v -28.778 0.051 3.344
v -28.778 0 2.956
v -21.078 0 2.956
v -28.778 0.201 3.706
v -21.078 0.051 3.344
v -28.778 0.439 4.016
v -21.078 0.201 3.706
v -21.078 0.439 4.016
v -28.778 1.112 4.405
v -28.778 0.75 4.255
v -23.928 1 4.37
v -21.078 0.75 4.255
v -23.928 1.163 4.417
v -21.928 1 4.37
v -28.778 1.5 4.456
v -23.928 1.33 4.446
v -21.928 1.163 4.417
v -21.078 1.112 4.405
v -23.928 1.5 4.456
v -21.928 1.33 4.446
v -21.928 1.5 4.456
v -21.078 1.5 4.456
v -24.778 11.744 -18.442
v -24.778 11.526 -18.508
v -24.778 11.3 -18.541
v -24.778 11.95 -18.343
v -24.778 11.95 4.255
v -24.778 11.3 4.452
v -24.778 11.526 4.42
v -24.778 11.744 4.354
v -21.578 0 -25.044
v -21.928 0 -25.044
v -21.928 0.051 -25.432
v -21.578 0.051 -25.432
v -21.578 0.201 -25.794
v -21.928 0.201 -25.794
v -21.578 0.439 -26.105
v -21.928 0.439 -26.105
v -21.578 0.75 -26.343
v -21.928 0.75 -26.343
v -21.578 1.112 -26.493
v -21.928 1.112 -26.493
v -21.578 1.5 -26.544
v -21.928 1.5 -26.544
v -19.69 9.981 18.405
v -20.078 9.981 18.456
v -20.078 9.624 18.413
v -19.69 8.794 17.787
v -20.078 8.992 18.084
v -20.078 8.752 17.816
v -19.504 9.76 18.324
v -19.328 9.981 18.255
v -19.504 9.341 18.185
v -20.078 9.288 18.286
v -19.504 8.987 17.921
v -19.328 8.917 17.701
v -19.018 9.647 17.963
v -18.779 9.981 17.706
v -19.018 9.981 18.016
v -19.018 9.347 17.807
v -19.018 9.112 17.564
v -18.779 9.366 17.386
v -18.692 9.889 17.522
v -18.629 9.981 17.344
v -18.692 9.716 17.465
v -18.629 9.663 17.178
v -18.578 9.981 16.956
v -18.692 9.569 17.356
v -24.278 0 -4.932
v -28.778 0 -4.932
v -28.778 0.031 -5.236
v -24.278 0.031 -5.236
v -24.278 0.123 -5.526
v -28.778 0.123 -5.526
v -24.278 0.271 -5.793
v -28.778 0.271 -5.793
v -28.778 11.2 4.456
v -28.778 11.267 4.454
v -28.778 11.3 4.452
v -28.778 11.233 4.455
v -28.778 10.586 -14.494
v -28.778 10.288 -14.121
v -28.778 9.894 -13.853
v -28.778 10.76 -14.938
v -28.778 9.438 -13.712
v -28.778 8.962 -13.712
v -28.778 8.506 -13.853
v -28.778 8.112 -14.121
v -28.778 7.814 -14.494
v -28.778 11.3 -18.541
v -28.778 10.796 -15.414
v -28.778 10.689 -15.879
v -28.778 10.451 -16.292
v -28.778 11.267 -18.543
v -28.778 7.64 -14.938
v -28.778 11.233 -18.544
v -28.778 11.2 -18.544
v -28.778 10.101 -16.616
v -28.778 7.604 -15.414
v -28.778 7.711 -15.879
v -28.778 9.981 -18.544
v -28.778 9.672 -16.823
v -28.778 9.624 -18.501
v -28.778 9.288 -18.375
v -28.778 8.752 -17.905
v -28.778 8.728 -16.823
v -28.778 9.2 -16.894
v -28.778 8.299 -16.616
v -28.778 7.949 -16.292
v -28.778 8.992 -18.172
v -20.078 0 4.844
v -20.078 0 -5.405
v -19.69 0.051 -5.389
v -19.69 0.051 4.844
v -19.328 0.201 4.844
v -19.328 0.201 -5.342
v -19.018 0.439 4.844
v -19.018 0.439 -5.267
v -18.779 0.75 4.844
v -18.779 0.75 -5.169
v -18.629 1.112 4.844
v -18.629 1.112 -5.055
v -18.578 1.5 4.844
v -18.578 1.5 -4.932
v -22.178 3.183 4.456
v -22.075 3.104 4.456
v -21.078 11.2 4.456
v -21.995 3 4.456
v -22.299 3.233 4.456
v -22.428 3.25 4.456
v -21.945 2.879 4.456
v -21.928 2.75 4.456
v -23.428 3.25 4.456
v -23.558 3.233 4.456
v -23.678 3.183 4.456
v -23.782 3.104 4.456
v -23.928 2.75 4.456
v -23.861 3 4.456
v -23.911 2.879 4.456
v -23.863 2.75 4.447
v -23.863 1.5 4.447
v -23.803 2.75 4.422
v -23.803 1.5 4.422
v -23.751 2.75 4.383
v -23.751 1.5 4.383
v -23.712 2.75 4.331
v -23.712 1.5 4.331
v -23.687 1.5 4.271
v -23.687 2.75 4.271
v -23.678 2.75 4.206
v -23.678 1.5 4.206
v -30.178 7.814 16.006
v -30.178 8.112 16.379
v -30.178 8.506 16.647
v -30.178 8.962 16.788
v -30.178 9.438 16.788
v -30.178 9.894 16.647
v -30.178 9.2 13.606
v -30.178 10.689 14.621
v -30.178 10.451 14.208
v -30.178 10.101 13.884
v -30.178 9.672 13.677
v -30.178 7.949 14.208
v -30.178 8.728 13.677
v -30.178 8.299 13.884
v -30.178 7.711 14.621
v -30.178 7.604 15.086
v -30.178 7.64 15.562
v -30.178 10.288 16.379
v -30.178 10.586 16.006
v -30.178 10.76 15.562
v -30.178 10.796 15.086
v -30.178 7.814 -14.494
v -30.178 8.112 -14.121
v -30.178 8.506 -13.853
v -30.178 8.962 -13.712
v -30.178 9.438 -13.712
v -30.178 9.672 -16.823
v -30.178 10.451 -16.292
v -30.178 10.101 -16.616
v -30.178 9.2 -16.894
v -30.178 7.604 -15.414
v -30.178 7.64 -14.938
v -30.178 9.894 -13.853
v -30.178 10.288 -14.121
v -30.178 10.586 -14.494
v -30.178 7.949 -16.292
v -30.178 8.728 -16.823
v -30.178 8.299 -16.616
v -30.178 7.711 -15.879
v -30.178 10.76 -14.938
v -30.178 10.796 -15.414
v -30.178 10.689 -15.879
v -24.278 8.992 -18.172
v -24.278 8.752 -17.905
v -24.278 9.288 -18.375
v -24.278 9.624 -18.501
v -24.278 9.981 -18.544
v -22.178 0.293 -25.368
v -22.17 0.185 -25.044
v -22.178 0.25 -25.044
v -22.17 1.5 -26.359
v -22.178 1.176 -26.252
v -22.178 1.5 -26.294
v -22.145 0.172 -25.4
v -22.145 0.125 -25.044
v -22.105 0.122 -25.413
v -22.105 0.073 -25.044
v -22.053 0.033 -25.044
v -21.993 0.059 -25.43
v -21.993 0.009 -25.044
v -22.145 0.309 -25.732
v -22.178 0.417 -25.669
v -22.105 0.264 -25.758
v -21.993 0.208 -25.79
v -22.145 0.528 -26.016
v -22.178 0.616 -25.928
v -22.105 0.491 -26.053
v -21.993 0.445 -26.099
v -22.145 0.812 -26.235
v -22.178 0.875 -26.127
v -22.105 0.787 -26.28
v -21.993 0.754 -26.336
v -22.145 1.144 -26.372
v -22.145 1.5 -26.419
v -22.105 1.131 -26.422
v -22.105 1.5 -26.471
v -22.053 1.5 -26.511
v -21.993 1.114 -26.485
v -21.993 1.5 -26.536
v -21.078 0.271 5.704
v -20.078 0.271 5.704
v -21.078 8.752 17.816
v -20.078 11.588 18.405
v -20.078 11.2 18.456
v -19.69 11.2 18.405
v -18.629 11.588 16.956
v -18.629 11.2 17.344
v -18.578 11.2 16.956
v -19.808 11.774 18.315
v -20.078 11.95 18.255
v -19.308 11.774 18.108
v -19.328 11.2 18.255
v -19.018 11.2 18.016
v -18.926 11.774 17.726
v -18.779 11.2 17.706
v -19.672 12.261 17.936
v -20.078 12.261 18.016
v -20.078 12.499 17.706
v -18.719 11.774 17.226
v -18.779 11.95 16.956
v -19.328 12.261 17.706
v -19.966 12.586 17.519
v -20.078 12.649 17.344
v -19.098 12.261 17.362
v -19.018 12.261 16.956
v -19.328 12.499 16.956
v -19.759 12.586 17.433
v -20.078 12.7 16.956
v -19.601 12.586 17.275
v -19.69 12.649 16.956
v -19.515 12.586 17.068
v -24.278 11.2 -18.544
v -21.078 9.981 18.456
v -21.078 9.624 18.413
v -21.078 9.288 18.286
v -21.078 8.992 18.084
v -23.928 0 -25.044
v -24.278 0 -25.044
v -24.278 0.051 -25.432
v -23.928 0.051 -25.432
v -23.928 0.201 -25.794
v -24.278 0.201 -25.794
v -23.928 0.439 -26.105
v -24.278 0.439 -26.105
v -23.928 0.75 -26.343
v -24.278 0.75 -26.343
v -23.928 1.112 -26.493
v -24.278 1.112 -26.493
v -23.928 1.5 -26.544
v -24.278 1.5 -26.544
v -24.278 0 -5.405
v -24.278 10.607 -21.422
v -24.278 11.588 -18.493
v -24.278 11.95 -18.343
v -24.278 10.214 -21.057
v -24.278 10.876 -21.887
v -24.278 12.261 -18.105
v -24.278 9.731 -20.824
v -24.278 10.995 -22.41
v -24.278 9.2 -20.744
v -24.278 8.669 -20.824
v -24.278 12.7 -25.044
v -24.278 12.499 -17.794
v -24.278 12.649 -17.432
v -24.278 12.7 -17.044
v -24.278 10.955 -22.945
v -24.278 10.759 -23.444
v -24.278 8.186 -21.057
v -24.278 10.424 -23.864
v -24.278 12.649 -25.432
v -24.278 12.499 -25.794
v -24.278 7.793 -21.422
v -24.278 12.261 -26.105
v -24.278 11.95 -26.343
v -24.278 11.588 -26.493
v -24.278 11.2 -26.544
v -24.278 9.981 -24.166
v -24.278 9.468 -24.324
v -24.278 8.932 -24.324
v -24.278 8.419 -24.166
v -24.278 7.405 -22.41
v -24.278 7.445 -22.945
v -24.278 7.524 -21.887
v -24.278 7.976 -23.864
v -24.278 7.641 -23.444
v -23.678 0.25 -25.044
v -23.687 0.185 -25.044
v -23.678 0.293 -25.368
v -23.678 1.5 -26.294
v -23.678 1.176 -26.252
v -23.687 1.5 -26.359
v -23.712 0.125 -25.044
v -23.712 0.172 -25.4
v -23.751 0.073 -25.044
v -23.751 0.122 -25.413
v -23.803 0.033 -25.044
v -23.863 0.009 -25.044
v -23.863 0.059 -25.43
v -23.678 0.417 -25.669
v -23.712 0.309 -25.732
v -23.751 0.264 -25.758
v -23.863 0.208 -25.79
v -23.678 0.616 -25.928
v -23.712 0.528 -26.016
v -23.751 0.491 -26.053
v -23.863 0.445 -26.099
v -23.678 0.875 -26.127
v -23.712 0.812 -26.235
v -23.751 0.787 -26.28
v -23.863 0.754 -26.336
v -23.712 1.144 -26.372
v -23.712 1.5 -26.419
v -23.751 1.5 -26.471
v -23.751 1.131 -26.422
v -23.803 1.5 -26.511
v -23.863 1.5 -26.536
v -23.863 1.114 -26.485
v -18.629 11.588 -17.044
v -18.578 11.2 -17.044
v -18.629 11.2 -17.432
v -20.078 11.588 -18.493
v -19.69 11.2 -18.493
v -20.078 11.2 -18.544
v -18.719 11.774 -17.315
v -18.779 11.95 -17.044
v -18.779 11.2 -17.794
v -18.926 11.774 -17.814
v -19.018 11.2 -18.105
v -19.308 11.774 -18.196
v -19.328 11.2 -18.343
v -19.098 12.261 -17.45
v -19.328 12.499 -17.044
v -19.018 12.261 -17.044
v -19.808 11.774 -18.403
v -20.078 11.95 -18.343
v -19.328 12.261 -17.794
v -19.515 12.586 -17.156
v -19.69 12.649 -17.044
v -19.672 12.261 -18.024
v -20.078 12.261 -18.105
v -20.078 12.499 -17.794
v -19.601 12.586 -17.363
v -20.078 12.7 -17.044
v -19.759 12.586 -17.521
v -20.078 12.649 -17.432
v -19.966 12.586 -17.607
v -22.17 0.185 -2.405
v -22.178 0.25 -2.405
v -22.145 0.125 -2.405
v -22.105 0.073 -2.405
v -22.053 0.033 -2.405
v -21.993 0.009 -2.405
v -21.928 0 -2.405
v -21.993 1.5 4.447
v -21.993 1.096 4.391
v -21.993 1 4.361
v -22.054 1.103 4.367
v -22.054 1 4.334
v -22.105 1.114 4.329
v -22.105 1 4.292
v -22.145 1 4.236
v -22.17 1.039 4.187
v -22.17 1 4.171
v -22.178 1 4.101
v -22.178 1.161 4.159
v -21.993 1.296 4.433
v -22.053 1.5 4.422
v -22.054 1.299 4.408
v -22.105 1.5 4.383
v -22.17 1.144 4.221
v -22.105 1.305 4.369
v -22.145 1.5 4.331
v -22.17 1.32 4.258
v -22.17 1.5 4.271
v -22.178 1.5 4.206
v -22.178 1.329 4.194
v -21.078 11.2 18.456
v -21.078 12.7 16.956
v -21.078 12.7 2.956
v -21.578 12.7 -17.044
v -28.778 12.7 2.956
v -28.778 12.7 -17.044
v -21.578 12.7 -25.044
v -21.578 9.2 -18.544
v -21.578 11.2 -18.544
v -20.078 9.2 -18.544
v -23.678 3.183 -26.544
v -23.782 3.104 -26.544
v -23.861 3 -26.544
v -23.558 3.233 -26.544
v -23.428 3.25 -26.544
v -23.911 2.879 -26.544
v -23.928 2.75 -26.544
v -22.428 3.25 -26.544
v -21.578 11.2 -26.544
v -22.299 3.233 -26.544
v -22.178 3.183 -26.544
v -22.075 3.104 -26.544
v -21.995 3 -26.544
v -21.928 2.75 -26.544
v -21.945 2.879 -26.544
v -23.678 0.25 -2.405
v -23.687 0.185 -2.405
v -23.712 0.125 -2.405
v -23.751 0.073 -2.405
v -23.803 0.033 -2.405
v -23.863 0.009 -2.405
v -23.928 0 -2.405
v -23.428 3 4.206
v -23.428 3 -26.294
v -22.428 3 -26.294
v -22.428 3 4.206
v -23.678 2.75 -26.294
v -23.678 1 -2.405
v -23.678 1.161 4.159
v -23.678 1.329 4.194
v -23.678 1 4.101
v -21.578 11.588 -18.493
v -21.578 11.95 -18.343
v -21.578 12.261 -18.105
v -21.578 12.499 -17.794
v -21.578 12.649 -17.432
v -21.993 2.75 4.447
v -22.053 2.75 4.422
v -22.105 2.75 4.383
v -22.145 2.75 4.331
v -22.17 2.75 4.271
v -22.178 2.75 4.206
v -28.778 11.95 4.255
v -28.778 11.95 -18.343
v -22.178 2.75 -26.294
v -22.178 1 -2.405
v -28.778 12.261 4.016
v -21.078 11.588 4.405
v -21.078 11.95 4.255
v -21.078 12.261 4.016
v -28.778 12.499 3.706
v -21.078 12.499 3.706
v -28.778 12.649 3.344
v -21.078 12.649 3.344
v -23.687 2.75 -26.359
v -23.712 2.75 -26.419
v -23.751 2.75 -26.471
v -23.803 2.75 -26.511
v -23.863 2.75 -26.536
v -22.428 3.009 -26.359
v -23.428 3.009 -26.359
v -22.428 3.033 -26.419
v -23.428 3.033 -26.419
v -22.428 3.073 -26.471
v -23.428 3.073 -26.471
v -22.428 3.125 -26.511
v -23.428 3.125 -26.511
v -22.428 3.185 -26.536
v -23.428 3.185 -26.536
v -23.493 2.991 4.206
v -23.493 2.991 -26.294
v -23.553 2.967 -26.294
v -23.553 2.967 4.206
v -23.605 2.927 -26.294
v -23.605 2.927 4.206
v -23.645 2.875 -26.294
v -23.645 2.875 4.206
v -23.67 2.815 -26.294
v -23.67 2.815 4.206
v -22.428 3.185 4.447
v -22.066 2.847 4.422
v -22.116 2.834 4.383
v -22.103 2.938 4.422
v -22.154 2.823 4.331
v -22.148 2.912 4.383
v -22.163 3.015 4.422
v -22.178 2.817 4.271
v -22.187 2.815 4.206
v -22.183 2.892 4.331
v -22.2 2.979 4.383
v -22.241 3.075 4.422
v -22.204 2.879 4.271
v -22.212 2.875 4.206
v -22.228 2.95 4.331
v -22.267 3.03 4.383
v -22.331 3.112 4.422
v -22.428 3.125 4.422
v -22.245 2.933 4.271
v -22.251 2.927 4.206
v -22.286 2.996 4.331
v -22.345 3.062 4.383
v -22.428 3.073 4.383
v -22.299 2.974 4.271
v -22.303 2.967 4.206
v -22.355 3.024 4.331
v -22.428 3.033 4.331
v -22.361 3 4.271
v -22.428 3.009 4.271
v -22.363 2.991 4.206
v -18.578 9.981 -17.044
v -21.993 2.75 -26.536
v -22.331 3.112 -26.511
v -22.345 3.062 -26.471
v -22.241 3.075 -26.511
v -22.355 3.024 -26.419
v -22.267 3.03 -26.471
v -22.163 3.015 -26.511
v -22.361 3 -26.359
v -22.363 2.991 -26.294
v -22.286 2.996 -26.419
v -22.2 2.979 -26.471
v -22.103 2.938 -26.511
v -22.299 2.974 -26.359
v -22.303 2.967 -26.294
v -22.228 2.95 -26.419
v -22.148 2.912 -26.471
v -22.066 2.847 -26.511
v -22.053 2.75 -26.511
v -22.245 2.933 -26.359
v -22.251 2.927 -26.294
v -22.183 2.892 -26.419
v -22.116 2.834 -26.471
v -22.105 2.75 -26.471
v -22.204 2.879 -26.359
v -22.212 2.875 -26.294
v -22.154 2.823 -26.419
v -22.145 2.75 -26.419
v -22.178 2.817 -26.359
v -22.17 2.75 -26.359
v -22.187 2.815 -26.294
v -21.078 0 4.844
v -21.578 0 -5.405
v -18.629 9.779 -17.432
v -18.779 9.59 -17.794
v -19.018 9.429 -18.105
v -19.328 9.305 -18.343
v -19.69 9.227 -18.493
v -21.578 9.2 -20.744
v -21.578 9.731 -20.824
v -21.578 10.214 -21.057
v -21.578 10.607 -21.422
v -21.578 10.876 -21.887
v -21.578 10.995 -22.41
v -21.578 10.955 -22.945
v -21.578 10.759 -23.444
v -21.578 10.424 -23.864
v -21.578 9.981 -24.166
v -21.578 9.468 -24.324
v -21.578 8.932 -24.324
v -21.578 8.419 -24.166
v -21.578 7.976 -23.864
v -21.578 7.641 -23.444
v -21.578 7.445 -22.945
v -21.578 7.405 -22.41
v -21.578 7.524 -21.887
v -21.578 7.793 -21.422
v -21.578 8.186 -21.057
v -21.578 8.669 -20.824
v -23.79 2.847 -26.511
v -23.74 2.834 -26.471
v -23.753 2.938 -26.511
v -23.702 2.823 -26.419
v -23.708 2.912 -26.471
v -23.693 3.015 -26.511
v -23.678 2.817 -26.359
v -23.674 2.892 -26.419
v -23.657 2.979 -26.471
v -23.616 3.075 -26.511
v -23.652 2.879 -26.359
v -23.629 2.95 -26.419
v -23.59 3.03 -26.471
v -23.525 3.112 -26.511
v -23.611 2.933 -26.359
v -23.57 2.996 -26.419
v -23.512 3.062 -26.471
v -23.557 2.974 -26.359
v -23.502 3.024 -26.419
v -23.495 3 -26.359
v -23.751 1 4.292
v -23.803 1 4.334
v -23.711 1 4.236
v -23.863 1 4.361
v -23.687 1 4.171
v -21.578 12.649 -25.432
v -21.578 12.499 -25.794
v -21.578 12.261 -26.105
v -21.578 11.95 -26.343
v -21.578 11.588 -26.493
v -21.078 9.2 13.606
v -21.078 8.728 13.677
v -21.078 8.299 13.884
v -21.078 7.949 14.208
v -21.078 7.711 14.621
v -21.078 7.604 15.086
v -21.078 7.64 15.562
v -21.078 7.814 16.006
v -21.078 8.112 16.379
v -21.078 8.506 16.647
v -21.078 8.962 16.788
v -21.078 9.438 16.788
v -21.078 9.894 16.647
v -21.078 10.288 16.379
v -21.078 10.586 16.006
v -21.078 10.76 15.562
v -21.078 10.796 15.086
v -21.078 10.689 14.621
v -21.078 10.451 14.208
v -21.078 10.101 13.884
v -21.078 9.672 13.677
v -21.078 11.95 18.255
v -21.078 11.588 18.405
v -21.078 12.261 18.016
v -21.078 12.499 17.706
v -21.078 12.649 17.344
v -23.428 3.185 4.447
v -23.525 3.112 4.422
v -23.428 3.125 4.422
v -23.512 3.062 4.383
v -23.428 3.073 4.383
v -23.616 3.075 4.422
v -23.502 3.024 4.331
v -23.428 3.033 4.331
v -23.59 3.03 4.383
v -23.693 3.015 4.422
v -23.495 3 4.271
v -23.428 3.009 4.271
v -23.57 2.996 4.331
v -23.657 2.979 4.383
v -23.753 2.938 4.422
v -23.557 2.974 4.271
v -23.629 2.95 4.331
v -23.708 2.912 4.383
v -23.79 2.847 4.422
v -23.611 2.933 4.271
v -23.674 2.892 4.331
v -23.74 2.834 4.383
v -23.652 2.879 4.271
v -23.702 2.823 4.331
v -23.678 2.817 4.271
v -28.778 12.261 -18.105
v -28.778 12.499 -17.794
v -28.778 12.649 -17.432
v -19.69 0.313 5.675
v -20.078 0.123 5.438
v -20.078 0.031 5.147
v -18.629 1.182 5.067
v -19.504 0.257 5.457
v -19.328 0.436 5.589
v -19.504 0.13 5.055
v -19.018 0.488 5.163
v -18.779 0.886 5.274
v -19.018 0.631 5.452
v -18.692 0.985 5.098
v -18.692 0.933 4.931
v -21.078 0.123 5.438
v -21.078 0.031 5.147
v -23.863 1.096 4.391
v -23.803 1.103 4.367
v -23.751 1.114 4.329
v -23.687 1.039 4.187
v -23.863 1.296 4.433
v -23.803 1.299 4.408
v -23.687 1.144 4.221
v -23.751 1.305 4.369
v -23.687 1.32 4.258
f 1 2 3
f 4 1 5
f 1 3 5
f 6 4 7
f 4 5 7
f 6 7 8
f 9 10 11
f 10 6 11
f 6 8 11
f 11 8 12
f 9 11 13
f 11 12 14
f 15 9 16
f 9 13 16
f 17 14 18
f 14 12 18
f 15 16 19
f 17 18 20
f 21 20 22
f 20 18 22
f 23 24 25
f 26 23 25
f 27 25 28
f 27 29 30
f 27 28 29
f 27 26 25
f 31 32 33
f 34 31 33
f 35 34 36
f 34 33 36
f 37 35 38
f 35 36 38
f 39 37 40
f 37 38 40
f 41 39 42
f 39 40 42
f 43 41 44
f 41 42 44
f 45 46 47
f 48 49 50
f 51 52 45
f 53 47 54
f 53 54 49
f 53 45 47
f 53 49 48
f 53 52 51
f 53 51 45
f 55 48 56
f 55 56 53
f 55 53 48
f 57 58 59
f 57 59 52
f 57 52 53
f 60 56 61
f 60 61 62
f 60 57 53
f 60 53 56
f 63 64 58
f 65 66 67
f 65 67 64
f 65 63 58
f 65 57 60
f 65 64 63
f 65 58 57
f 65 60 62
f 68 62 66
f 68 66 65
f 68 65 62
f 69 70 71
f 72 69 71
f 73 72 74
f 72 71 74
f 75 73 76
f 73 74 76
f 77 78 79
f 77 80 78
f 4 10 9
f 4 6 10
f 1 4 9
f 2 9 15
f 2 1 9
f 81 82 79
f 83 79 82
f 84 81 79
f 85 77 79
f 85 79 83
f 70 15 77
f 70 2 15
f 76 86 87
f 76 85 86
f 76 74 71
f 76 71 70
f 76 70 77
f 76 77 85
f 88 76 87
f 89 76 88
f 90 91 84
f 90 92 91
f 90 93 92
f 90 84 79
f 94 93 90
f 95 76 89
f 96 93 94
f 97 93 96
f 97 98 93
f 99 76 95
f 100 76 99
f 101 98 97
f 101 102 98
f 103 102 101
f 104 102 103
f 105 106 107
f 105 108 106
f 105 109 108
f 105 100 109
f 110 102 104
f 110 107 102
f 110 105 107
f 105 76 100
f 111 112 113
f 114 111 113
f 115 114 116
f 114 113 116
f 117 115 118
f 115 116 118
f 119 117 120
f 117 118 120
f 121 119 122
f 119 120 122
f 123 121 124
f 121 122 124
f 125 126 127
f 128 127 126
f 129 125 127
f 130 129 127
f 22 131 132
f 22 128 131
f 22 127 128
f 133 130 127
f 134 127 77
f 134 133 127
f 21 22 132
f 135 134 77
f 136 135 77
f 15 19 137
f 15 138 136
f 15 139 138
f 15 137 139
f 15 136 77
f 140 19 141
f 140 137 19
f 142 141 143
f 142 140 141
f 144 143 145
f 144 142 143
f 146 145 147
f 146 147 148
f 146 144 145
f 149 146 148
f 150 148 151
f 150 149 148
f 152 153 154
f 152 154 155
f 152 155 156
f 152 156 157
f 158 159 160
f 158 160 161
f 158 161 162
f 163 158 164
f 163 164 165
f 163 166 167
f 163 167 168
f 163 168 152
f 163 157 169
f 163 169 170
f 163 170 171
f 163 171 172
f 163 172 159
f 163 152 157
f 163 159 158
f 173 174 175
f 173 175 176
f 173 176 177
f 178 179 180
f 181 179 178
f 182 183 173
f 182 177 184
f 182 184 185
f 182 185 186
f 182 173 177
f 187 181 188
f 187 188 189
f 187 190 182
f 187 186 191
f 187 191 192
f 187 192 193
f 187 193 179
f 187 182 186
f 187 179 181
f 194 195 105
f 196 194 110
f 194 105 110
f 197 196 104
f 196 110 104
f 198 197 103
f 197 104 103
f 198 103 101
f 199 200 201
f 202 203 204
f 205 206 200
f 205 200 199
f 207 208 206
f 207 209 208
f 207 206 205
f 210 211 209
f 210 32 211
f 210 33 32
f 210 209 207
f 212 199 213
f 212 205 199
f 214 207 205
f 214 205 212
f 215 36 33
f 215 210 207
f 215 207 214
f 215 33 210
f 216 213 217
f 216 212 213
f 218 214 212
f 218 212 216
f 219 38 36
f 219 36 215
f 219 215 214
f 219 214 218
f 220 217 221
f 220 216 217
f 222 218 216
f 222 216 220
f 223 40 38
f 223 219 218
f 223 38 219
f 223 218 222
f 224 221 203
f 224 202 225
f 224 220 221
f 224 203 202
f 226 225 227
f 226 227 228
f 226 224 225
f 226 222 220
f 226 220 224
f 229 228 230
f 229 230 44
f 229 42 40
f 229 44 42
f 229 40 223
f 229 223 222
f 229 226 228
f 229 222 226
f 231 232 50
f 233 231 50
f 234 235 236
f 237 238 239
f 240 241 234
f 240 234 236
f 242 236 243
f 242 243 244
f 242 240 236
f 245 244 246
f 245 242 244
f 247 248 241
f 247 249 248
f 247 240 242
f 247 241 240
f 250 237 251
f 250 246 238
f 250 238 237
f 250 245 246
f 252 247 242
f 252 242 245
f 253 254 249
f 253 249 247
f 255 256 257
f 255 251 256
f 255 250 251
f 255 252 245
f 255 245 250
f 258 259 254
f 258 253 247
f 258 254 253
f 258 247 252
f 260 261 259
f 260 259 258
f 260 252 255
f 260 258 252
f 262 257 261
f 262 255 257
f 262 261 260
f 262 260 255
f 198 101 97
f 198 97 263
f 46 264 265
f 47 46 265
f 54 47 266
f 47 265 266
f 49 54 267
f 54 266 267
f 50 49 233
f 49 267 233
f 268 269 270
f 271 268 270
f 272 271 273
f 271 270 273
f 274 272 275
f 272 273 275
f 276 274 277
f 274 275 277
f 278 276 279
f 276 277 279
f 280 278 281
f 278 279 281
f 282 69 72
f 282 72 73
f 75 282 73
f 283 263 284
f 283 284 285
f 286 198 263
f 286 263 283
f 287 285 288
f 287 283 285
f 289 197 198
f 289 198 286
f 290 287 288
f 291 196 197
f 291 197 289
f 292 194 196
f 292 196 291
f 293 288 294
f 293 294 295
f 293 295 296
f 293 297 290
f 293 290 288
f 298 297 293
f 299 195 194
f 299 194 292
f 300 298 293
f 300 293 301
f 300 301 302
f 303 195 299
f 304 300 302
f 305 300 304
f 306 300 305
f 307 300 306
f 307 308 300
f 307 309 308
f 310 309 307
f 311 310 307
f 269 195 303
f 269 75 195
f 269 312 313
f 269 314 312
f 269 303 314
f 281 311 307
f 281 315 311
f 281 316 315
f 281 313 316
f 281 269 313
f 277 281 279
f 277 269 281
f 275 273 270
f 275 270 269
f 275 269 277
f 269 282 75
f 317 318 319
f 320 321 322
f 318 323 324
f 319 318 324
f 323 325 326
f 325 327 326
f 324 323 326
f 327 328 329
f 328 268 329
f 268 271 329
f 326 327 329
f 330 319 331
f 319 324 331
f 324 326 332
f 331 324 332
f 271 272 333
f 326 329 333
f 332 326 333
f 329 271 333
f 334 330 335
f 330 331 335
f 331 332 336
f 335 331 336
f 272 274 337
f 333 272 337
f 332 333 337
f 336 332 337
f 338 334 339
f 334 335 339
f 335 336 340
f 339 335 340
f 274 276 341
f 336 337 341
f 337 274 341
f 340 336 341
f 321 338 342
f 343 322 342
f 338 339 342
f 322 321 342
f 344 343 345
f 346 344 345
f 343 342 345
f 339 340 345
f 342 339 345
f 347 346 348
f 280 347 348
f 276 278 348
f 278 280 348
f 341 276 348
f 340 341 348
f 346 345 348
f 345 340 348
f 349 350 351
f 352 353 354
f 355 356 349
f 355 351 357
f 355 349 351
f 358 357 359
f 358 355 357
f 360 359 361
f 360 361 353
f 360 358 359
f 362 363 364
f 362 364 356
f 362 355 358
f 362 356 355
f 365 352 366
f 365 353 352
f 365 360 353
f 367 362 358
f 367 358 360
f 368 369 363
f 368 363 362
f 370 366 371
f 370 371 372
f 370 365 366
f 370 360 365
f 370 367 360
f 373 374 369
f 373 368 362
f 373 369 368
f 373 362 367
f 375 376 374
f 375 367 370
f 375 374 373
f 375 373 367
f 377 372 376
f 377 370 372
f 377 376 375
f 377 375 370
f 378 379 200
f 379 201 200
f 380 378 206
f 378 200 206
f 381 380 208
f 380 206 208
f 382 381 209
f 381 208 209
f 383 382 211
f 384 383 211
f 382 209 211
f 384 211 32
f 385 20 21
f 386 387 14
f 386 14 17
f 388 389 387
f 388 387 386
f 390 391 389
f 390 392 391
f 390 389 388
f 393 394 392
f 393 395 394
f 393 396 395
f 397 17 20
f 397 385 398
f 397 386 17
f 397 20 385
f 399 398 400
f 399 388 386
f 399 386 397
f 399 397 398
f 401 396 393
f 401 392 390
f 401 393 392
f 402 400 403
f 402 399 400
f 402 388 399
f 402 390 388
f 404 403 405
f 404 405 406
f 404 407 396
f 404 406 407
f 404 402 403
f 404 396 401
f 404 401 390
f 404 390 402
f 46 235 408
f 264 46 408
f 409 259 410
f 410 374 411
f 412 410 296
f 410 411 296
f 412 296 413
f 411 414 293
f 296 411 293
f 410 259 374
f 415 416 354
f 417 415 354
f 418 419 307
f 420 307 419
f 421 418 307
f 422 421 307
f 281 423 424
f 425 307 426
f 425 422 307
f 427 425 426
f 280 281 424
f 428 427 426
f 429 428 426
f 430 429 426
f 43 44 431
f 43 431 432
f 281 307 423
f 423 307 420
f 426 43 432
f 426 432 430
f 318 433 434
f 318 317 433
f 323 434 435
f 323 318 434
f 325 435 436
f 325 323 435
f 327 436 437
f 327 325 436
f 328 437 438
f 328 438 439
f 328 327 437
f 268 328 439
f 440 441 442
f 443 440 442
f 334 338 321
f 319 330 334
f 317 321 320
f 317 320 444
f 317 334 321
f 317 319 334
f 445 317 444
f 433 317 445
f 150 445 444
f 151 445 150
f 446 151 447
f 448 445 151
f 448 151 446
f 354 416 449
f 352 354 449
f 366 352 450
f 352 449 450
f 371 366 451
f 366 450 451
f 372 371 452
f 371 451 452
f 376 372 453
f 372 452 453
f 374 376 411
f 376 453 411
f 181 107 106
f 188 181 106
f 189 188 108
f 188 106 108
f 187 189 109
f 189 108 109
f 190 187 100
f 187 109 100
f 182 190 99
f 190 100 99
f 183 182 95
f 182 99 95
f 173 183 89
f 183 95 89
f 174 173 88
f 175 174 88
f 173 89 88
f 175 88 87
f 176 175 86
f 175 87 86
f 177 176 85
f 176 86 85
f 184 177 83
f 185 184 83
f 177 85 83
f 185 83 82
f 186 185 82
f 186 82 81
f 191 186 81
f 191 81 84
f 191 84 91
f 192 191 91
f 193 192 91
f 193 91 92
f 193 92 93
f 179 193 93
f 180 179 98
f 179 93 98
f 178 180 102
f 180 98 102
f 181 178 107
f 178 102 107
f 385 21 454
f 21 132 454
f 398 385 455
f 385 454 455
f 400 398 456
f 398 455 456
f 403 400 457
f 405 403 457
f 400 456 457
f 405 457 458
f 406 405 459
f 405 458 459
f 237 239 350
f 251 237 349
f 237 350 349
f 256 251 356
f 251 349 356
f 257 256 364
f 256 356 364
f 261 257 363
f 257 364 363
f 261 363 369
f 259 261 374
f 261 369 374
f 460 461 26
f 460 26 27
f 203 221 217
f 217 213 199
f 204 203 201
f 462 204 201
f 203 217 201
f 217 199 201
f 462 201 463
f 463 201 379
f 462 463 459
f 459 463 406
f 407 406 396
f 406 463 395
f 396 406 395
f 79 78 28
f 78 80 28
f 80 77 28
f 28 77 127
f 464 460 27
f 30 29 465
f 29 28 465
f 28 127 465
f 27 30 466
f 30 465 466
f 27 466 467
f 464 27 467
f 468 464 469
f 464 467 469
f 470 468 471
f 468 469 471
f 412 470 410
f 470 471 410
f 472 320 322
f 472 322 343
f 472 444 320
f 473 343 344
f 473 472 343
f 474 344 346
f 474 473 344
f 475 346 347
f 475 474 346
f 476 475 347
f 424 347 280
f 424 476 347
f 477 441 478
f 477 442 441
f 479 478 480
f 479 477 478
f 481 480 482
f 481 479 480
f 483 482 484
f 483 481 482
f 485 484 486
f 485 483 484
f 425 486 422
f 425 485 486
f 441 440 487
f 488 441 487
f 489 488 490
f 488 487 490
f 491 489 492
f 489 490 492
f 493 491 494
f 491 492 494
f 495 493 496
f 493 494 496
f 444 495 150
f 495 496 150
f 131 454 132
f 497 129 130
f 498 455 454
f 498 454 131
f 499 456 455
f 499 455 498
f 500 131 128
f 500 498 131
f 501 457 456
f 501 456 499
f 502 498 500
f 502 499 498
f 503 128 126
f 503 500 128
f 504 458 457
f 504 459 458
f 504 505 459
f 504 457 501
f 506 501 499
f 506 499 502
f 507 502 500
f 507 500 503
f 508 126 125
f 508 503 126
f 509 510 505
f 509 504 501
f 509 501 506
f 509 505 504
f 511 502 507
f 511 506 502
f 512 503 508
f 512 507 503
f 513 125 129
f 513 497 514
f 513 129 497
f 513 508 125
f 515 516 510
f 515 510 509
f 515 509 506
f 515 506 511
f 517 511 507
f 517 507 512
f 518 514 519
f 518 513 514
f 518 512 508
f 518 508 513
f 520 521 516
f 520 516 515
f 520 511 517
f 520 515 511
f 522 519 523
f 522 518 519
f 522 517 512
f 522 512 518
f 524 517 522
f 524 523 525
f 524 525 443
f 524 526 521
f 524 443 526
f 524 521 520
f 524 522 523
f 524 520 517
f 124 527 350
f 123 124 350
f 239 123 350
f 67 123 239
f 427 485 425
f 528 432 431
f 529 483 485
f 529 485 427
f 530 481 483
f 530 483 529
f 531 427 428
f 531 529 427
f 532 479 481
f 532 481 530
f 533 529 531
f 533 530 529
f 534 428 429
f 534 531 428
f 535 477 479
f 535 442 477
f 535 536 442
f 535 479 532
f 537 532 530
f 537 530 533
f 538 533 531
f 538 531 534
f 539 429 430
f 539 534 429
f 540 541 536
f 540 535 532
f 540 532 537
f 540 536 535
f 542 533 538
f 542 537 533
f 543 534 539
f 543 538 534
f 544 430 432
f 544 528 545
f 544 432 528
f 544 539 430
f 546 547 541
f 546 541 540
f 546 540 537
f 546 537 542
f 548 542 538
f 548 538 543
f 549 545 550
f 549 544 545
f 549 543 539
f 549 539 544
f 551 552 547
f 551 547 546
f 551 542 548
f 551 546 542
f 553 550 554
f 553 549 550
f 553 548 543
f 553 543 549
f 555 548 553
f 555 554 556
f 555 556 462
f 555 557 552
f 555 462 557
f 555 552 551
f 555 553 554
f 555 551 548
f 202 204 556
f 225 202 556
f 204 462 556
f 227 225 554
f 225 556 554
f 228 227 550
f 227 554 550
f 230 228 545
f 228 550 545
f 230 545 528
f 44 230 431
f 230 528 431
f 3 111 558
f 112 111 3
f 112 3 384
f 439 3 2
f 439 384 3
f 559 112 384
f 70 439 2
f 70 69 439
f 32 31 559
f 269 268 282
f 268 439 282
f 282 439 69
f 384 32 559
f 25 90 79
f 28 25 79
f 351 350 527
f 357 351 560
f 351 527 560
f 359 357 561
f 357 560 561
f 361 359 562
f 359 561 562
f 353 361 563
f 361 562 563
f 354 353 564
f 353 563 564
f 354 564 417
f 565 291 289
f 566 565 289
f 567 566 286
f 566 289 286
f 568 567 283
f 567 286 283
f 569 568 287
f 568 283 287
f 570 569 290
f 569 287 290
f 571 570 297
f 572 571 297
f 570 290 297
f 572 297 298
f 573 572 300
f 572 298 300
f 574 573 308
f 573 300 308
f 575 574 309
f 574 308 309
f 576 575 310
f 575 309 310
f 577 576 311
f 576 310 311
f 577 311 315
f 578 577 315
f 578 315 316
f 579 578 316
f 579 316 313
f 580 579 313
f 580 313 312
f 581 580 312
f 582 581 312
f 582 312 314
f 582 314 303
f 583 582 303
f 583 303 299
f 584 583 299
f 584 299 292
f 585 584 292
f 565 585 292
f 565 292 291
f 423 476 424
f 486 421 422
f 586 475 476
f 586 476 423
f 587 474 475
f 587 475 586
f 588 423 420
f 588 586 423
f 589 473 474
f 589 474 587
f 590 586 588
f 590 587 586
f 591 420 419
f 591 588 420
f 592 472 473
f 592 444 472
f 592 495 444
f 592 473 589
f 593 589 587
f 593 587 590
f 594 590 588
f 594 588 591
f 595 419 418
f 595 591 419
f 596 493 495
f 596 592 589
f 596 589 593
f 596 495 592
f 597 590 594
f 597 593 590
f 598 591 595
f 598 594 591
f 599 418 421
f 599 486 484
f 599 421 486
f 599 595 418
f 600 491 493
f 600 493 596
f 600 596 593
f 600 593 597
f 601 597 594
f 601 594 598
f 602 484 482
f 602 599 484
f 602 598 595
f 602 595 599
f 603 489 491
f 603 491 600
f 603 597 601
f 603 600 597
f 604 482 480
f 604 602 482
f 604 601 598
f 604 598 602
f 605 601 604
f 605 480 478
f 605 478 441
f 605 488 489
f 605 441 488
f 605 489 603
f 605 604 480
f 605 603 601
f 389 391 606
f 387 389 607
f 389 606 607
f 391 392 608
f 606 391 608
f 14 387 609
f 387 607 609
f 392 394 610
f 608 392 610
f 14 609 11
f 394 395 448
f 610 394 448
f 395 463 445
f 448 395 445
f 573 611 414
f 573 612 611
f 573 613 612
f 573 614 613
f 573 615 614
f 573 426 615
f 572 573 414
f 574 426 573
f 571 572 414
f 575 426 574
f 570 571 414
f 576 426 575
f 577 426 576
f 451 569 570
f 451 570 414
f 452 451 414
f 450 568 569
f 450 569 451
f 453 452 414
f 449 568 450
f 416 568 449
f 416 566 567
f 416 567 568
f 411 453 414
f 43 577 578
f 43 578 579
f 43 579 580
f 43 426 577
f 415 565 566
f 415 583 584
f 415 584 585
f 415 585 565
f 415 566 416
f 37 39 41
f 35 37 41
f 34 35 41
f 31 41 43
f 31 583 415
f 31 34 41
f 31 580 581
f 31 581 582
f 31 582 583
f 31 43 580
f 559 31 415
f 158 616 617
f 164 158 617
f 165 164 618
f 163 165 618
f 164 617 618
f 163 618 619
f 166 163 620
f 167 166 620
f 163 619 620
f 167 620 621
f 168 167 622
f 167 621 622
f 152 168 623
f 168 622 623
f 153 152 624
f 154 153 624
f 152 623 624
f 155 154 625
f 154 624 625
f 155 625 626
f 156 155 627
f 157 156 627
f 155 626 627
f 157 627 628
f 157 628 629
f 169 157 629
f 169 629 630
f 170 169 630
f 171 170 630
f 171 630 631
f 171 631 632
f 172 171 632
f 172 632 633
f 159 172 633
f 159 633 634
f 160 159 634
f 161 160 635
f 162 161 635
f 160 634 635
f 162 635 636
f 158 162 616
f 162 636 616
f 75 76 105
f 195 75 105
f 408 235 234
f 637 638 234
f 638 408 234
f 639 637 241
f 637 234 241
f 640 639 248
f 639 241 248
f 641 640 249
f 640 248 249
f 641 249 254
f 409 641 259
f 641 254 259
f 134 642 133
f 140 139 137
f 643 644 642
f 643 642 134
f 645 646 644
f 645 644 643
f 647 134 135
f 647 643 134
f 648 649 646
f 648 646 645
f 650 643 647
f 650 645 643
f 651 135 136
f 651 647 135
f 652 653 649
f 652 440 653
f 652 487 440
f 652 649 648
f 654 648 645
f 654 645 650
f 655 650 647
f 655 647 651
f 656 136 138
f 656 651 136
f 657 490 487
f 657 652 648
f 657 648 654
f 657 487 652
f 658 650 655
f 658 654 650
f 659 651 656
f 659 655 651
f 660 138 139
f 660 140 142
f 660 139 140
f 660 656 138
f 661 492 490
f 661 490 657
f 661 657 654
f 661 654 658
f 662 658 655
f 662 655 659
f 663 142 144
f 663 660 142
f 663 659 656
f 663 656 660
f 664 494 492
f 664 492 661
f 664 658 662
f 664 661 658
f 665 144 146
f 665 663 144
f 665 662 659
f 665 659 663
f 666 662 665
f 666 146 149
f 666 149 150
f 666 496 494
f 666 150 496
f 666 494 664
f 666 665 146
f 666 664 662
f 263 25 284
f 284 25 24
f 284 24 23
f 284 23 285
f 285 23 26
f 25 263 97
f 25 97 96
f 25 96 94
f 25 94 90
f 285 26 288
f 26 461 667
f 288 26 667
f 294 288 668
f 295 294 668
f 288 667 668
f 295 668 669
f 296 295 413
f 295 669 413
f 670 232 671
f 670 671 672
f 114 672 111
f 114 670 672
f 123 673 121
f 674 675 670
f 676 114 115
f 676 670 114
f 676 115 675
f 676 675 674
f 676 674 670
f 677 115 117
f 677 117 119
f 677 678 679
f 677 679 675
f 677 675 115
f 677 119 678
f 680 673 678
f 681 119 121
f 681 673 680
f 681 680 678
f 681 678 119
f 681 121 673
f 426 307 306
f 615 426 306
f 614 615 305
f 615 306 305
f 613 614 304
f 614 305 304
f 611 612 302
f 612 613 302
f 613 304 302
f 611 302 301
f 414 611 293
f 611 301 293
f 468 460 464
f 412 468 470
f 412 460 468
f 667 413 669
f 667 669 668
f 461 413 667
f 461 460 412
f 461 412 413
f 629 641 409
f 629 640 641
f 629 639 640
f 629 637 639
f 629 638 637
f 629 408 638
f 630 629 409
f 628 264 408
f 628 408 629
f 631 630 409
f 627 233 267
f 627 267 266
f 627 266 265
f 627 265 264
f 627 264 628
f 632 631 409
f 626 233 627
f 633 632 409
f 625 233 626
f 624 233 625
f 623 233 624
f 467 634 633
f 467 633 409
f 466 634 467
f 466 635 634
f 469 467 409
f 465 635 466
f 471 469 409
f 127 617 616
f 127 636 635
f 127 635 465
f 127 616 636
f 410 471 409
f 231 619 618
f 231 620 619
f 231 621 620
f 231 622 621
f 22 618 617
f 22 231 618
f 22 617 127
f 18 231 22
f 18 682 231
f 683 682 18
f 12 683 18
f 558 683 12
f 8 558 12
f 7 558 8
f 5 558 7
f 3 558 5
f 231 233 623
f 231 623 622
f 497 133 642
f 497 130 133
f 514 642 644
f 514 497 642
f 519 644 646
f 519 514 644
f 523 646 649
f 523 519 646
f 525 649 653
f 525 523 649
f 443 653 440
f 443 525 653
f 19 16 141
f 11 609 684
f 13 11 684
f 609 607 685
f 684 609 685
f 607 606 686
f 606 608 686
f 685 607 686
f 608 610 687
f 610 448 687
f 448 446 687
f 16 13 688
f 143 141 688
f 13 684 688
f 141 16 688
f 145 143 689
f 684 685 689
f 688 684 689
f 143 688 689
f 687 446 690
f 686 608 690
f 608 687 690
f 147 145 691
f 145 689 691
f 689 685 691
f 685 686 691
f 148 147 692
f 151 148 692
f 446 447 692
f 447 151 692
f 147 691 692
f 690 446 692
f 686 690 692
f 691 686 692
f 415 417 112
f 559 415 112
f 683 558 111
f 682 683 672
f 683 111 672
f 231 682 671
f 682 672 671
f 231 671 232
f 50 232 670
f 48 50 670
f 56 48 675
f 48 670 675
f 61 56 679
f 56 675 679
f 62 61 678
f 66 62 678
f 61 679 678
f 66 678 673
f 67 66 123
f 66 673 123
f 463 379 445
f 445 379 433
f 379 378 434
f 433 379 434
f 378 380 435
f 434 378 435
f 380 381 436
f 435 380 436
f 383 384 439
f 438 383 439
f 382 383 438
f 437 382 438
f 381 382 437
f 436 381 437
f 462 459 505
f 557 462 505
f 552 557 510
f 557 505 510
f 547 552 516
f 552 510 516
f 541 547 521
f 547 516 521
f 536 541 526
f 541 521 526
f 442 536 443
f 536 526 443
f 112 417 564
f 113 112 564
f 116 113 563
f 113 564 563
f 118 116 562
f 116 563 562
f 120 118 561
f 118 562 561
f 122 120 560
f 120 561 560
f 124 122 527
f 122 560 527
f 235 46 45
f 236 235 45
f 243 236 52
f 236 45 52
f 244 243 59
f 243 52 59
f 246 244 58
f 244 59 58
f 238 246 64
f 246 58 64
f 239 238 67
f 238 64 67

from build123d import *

# Parameters (mm, degrees)
BOSS_EXTRUDE1_DEPTH = 12.7
CUT_EXTRUDE2_DEPTH  = 4.5
CUT_EXTRUDE3_DEPTH  = 32.143608507
BOSS_EXTRUDE2_START = -7.7
SKETCH2_5_R         = 1.6
BOSS_EXTRUDE2_DEPTH = 9.1
SKETCH2_6_R         = 1.8
CUT_EXTRUDE4_DEPTH  = 32.143608507
SKETCH2_7_R         = 1.6
BOSS_EXTRUDE3_DEPTH = 1.4
SKETCH2_8_W         = 45
SKETCH2_8_H         = 0.65
CUT_EXTRUDE5_DEPTH  = 4
CUT_EXTRUDE6_REACH  = 33.63
SKETCH4_W           = 1.5
SKETCH4_H           = 31
CUT_EXTRUDE7_DEPTH  = 3
SKETCH6_W           = 2.1
SKETCH6_H           = 6.861038338
BOSS_EXTRUDE4_DEPTH = 1
CUT_EXTRUDE8_DEPTH  = 4.5
FILLET1_R           = 1.5
FILLET2_R           = 0.25


with BuildPart() as part:
    # Sketch1 → Boss-Extrude1 (new body)
    with BuildSketch(Plane(origin=(0, 0, 0), x_dir=(1, 0, 0), z_dir=(0, 1, 0))):
        Polygon((-28.77817965, 18.54419618), (-24.27817965, 18.54419618), (-24.27817965, 26.54419618), (-21.57817965, 26.54419618), (-21.57817965, 18.54419618), (-18.57817965, 18.54419618), (-18.57817965, -18.45580382), (-21.07817965, -18.45580382), (-21.07817965, -4.45580382), (-28.77817965, -4.45580382), align=None)
    extrude(amount=BOSS_EXTRUDE1_DEPTH)

    # Sketch2 → Cut-Extrude2 (cut)
    with BuildSketch(Plane.ZY.offset(28.77817965)):
        Polygon((-18.54419618, 5.764870839), (-18.54419618, 0), (-7.040359819, 0), align=None)
    extrude(amount=-CUT_EXTRUDE2_DEPTH, mode=Mode.SUBTRACT)

    # Sketch2<4> → Cut-Extrude3 (cut, through all)
    with BuildSketch(Plane.ZY.offset(28.77817965)):
        Polygon((15.124702683, 0), (18.45580382, 0), (18.45580382, 9.2), align=None)
    extrude(amount=-CUT_EXTRUDE3_DEPTH, mode=Mode.SUBTRACT)

    # Sketch2<5> → Boss-Extrude2 (add)
    with BuildSketch(Plane.ZY.offset(28.77817965).offset(BOSS_EXTRUDE2_START)):
        with Locations(Location((15.20580382, 9.2, 0), (0, 0, 180))):
            Circle(SKETCH2_5_R)
    extrude(amount=BOSS_EXTRUDE2_DEPTH)

    # Sketch2<6> → Cut-Extrude4 (cut, through all)
    with BuildSketch(Plane.ZY.offset(28.77817965)):
        with Locations((-22.54419618, 9.2)):
            Circle(SKETCH2_6_R)
    extrude(amount=-CUT_EXTRUDE4_DEPTH, mode=Mode.SUBTRACT)

    # Sketch2<7> → Boss-Extrude3 (add)
    with BuildSketch(Plane.ZY.offset(28.77817965)):
        with Locations(Location((-15.29419618, 9.2, 0), (0, 0, 180))):
            Circle(SKETCH2_7_R)
    extrude(amount=BOSS_EXTRUDE3_DEPTH)

    # Sketch2<8> → Cut-Extrude5 (cut)
    with BuildSketch(Plane.ZY.offset(28.77817965)):
        with Locations((-4.04419618, 11.625)):
            Rectangle(SKETCH2_8_W, SKETCH2_8_H)
    extrude(amount=-CUT_EXTRUDE5_DEPTH, mode=Mode.SUBTRACT)

    # Cut-Extrude6: up to this face of the body (flat: up to its plane)
    cut_extrude6_end = Plane(part.part.faces().sort_by_distance((-21.57817965, 6.032683514, -22.54419618))[0])
    # Sketch3 → Cut-Extrude6 (cut, up to the picked face)
    with BuildSketch(Plane(origin=(-18.57817965, 0, 0), x_dir=(0, 0, -1), z_dir=(1, 0, 0)), mode=Mode.PRIVATE) as cut_extrude6_sk1:
        Polygon((18.54419618, 0), (18.54419618, 9.2), (5.405234518, 0), align=None)
    cut_extrude6_tool1 = split(extrude(cut_extrude6_sk1.sketch, amount=-CUT_EXTRUDE6_REACH, mode=Mode.PRIVATE), bisect_by=cut_extrude6_end, keep=Keep.BOTH, mode=Mode.PRIVATE)
    # Sketch3 → Cut-Extrude6 (cut, up to the picked face)
    with BuildSketch(Plane(origin=(-18.57817965, 0, 0), x_dir=(0, 0, -1), z_dir=(1, 0, 0)), mode=Mode.PRIVATE) as cut_extrude6_sk2:
        Polygon((-15.124702683, 0), (-18.45580382, 9.2), (-18.45580382, 0), align=None)
    cut_extrude6_tool2 = split(extrude(cut_extrude6_sk2.sketch, amount=-CUT_EXTRUDE6_REACH, mode=Mode.PRIVATE), bisect_by=cut_extrude6_end, keep=Keep.BOTH, mode=Mode.PRIVATE)
    # Sketch3 → Cut-Extrude6 (cut, up to the picked face)
    with BuildSketch(Plane(origin=(-18.57817965, 0, 0), x_dir=(0, 0, -1), z_dir=(1, 0, 0)), mode=Mode.PRIVATE) as cut_extrude6_sk3:
        Polygon((-5.316842158, 0), (-18.45580382, 9.2), (-15.124702683, 0), align=None)
    cut_extrude6_tool3 = split(extrude(cut_extrude6_sk3.sketch, amount=-CUT_EXTRUDE6_REACH, mode=Mode.PRIVATE), bisect_by=cut_extrude6_end, keep=Keep.BOTH, mode=Mode.PRIVATE)
    add(cut_extrude6_tool1.solids().sort_by(Axis((-18.57818, 3.066667, -14.164542), (-1, 0, 0)))[0], mode=Mode.SUBTRACT)
    add(cut_extrude6_tool2.solids().sort_by(Axis((-18.57818, 3.066667, 17.345437), (-1, 0, 0)))[0], mode=Mode.SUBTRACT)
    add(cut_extrude6_tool3.solids().sort_by(Axis((-18.57818, 3.066667, 12.965783), (-1, 0, 0)))[0], mode=Mode.SUBTRACT)

    # Sketch4 → Cut-Extrude7 (cut)
    with BuildSketch(Plane.XZ):
        with Locations((-22.92817965, -11.04419618)):
            Rectangle(SKETCH4_W, SKETCH4_H)
    extrude(amount=-CUT_EXTRUDE7_DEPTH, mode=Mode.SUBTRACT)

    # Sketch6 → Boss-Extrude4 (add)
    with BuildSketch(Plane(origin=(0, 0, 0), x_dir=(-1, 0, 0), z_dir=(0, -1, 0))):
        with Locations((22.62817965, -1.025284651)):
            Rectangle(SKETCH6_W, SKETCH6_H)
    extrude(amount=-BOSS_EXTRUDE4_DEPTH)

    # Sketch8 → Cut-Extrude8 (cut)
    with BuildSketch(Plane.ZY.offset(28.77817965)):
        Polygon((-18.54419618, 0), (-7.040359819, 0), (-18.54419618, 5.764870839), align=None)
        Polygon((-7.040359819, 0), (-5.405234518, 0), (-18.54419618, 9.2), (-18.54419618, 5.764870839), align=None)
    extrude(amount=-CUT_EXTRUDE8_DEPTH, mode=Mode.SUBTRACT)

    # Fillet1
    # the kernel refuses this fillet: 1.5 mm, written as the material it takes off along each edge
    with BuildSketch(Plane(origin=(-20.07817965, 9.980850576, 16.95580382), x_dir=(0, 0, 1), z_dir=(1, 0, 0))) as fillet1_piece_1_section:
        Polygon((0, 0), (FILLET1_R, 0), (FILLET1_R, FILLET1_R * 0.520567050552), (FILLET1_R * 0.573576436351, FILLET1_R * 0.819152044289), align=None)
    fillet1_piece_1 = extrude(amount=FILLET1_R, mode=Mode.PRIVATE)
    fillet1_piece_1 = fillet1_piece_1 - Plane(origin=(-20.07817965, 9.980850576, 16.95580382), x_dir=(0, 0.4617486132350316, -0.8870108331782229), z_dir=(1, 0, 0)) * Sphere(FILLET1_R, mode=Mode.PRIVATE)
    add(fillet1_piece_1, mode=Mode.SUBTRACT)
    with BuildSketch(Plane(origin=(-20.07817965, 11.2, 16.95580382), x_dir=(1, 0, 0), z_dir=(0, 1, 0))) as fillet1_piece_2_section:
        Polygon((0, 0), (FILLET1_R, 0), (FILLET1_R, -FILLET1_R), (0, -FILLET1_R), align=None)
    fillet1_piece_2 = extrude(amount=FILLET1_R, mode=Mode.PRIVATE)
    fillet1_piece_2 = fillet1_piece_2 - Plane(origin=(-20.07817965, 11.2, 16.95580382), x_dir=(-0.7071067811865476, 0, -0.7071067811865475), z_dir=(0, 1, 0)) * Sphere(FILLET1_R, mode=Mode.PRIVATE)
    add(fillet1_piece_2, mode=Mode.SUBTRACT)
    with BuildSketch(Plane(origin=(-20.07817965, 1.5, 4.843893974), x_dir=(0, -0.8191520442889888, 0.5735764363510504), z_dir=(1, 0, 0))) as fillet1_piece_3_section:
        Polygon((0, 0), (FILLET1_R, 0), (FILLET1_R, FILLET1_R * 0.315298788879), (FILLET1_R * 0.819152044289, FILLET1_R * 0.573576436351), align=None)
    fillet1_piece_3 = extrude(amount=FILLET1_R, mode=Mode.PRIVATE)
    fillet1_piece_3 = fillet1_piece_3 - Plane(origin=(-20.07817965, 1.5, 4.843893974), x_dir=(0, 0.9537169507482262, -0.3007057995042756), z_dir=(1, 0, 0)) * Sphere(FILLET1_R, mode=Mode.PRIVATE)
    add(fillet1_piece_3, mode=Mode.SUBTRACT)
    with BuildSketch(Plane(origin=(-20.07817965, 11.2, -17.04419618), x_dir=(1, 0, 0), z_dir=(0, 1, 0))) as fillet1_piece_4_section:
        Polygon((0, 0), (FILLET1_R, 0), (FILLET1_R, FILLET1_R), (0, FILLET1_R), align=None)
    fillet1_piece_4 = extrude(amount=FILLET1_R, mode=Mode.PRIVATE)
    fillet1_piece_4 = fillet1_piece_4 - Plane(origin=(-20.07817965, 11.2, -17.04419618), x_dir=(-0.7071067811865475, 0, 0.7071067811865477), z_dir=(0, 1, 0)) * Sphere(FILLET1_R, mode=Mode.PRIVATE)
    add(fillet1_piece_4, mode=Mode.SUBTRACT)
    with BuildSketch(Plane(origin=(-21.07817965, 0, 4.45580382), x_dir=(0, 1, 0), z_dir=(-1, 0, 0))) as fillet1_piece_5:
        with BuildLine():
            CenterArc((FILLET1_R, FILLET1_R), FILLET1_R, 180, 90)
            Line((0, FILLET1_R), (0, 0))
            Line((0, 0), (FILLET1_R, 0))
        make_face()
    extrude(amount=11.45, mode=Mode.SUBTRACT)
    with BuildSketch(Plane(origin=(-21.07817965, 12.7, 4.45580382), x_dir=(0, -1, 0), z_dir=(-1, 0, 0))) as fillet1_piece_6:
        with BuildLine():
            CenterArc((FILLET1_R, -FILLET1_R), FILLET1_R, 90, 90)
            Line((0, -FILLET1_R), (0, 0))
            Line((0, 0), (FILLET1_R, 0))
        make_face()
    extrude(amount=11.45, mode=Mode.SUBTRACT)
    with BuildSketch(Plane(origin=(-25.92817965, 0, -26.54419618), x_dir=(0, 1, 0), z_dir=(1, 0, 0)), Plane(origin=(-28.02817965, 0, -26.54419618), x_dir=(0, 1, 0), z_dir=(1, 0, 0))) as fillet1_piece_7:
        with BuildLine():
            CenterArc((FILLET1_R, FILLET1_R), FILLET1_R, 180, 90)
            Line((0, FILLET1_R), (0, 0))
            Line((0, 0), (FILLET1_R, 0))
        make_face()
    extrude(amount=8.1, mode=Mode.SUBTRACT)
    with BuildSketch(Plane(origin=(-28.02817965, 12.7, -26.54419618), x_dir=(0, -1, 0), z_dir=(1, 0, 0))) as fillet1_piece_8:
        with BuildLine():
            CenterArc((FILLET1_R, -FILLET1_R), FILLET1_R, 90, 90)
            Line((0, -FILLET1_R), (0, 0))
            Line((0, 0), (FILLET1_R, 0))
        make_face()
    extrude(amount=10.2, mode=Mode.SUBTRACT)
    with BuildSketch(Plane(origin=(-18.57817965, 9.980850576, 18.45580382), x_dir=(0, 0, -1), z_dir=(0, 1, 0))) as fillet1_piece_9:
        with BuildLine():
            CenterArc((FILLET1_R, FILLET1_R), FILLET1_R, 180, 90)
            Line((0, FILLET1_R), (0, 0))
            Line((0, 0), (FILLET1_R, 0))
        make_face()
    extrude(amount=1.219149424, mode=Mode.SUBTRACT)
    with BuildSketch(Plane(origin=(-23.03030609, 9.2, 18.45580382), x_dir=(0, 1, 0), z_dir=(1, 0, 0))) as fillet1_piece_10:
        with BuildLine():
            CenterArc((FILLET1_R * 0.520567050552, -FILLET1_R), FILLET1_R, 90, 55)
            Line((-FILLET1_R * 0.298584993737, -FILLET1_R * 0.426423563649), (0, 0))
            Line((0, 0), (FILLET1_R * 0.520567050552, 0))
        make_face()
    extrude(amount=2.95212644, mode=Mode.SUBTRACT)
    with BuildSketch(Plane(origin=(-20.07817965, 12.7, 18.45580382), x_dir=(0, -1, 0), z_dir=(-1, 0, 0))) as fillet1_piece_11:
        with BuildLine():
            CenterArc((FILLET1_R, -FILLET1_R), FILLET1_R, 90, 90)
            Line((0, -FILLET1_R), (0, 0))
            Line((0, 0), (FILLET1_R, 0))
        make_face()
    extrude(amount=4.75, mode=Mode.SUBTRACT)
    with BuildSketch(Plane(origin=(-20.07817965, 0, 5.316842158), x_dir=(0, 0.5735764363510512, 0.8191520442889884), z_dir=(-1, 0, 0))) as fillet1_piece_12:
        with BuildLine():
            CenterArc((FILLET1_R * 0.315298788879, FILLET1_R), FILLET1_R, 235, 35)
            Line((-FILLET1_R * 0.258277647472, FILLET1_R * 0.180847955711), (0, 0))
            Line((0, 0), (FILLET1_R * 0.315298788879, 0))
        make_face()
    extrude(amount=2.182370458, mode=Mode.SUBTRACT)
    with BuildSketch(Plane(origin=(-18.57817965, 0.271271934, 5.704258629), x_dir=(0, 0.8191520442889888, -0.5735764363510504), z_dir=(0, 0.5735764363510504, 0.8191520442889888))) as fillet1_piece_13:
        with BuildLine():
            CenterArc((FILLET1_R, FILLET1_R), FILLET1_R, 180, 90)
            Line((0, FILLET1_R), (0, 0))
            Line((0, 0), (FILLET1_R, 0))
        make_face()
    extrude(amount=14.785911761, mode=Mode.SUBTRACT)
    with BuildSketch(Plane(origin=(-18.57817965, 0, -9.155234518), x_dir=(0, 1, 0), z_dir=(0, 0, 1))) as fillet1_piece_14:
        with BuildLine():
            CenterArc((FILLET1_R, FILLET1_R), FILLET1_R, 180, 90)
            Line((0, FILLET1_R), (0, 0))
            Line((0, 0), (FILLET1_R, 0))
        make_face()
    extrude(amount=13.999128493, mode=Mode.SUBTRACT)
    with BuildSketch(Plane(origin=(-18.57817965, 11.350911636, -21.616016346), x_dir=(-1, 0, 0), z_dir=(0, -0.5735764363510504, 0.8191520442889889))) as fillet1_piece_15:
        with BuildLine():
            CenterArc((FILLET1_R, -FILLET1_R), FILLET1_R, 90, 90)
            Line((0, -FILLET1_R), (0, 0))
            Line((0, 0), (FILLET1_R, 0))
        make_face()
    extrude(amount=23.53971052, mode=Mode.SUBTRACT)
    with BuildSketch(Plane(origin=(-18.57817965, 5.45, -18.54419618), x_dir=(0, 0, 1), z_dir=(0, 1, 0))) as fillet1_piece_16:
        with BuildLine():
            CenterArc((FILLET1_R, -FILLET1_R), FILLET1_R, 90, 90)
            Line((0, -FILLET1_R), (0, 0))
            Line((0, 0), (FILLET1_R, 0))
        make_face()
    extrude(amount=5.75, mode=Mode.SUBTRACT)
    with BuildSketch(Plane(origin=(-32.52817965, 12.7, -18.54419618), x_dir=(0, 0, 1), z_dir=(1, 0, 0))) as fillet1_piece_17:
        with BuildLine():
            CenterArc((FILLET1_R, FILLET1_R), FILLET1_R, 180, 90)
            Line((0, FILLET1_R), (0, 0))
            Line((0, 0), (FILLET1_R, 0))
        make_face()
    extrude(amount=8.25, mode=Mode.SUBTRACT)
    with BuildSketch(Plane(origin=(-32.52817965, 12.7, -18.54419618), x_dir=(0, 0, 1), z_dir=(1, 0, 0))) as fillet1_piece_18_section:
        with BuildLine():
            CenterArc((FILLET1_R, FILLET1_R), FILLET1_R, 180, 90)
            Line((0, FILLET1_R), (0, 0))
            Line((0, 0), (FILLET1_R, 0))
        make_face()
    fillet1_piece_18 = extrude(amount=12, mode=Mode.PRIVATE)
    fillet1_piece_18 = split(fillet1_piece_18, bisect_by=Plane(origin=(-21.57817965, 12.360407329, -18.204603509), z_dir=(1, 0, 0)), keep=Keep.TOP, mode=Mode.PRIVATE)
    add(fillet1_piece_18, mode=Mode.SUBTRACT)
    with BuildSketch(Plane(origin=(-25.32817965, 12.7, -18.54419618), x_dir=(0, -1, 0), z_dir=(1, 0, 0))) as fillet1_piece_19_section:
        with BuildLine():
            CenterArc((FILLET1_R, -FILLET1_R), FILLET1_R, 90, 90)
            Line((0, -FILLET1_R), (0, 0))
            Line((0, 0), (FILLET1_R, 0))
        make_face()
    fillet1_piece_19 = extrude(amount=5.25, mode=Mode.PRIVATE)
    fillet1_piece_19 = split(fillet1_piece_19, bisect_by=Plane(origin=(-24.27817965, 12.360407329, -18.204603509), z_dir=(-1, 0, 0)), keep=Keep.TOP, mode=Mode.PRIVATE)
    add(fillet1_piece_19, mode=Mode.SUBTRACT)
    with BuildSketch(Plane(origin=(-21.57817965, 12.7, -18.54419618), x_dir=(0, -1, 0), z_dir=(1, 0, 0))) as fillet1_piece_20:
        with BuildLine():
            CenterArc((FILLET1_R, -FILLET1_R), FILLET1_R, 90, 90)
            Line((0, -FILLET1_R), (0, 0))
            Line((0, 0), (FILLET1_R, 0))
        make_face()
    extrude(amount=1.5, mode=Mode.SUBTRACT)
    with BuildSketch(Plane(origin=(-18.57817965, 12.7, -17.04419618), x_dir=(0, -1, 0), z_dir=(0, 0, 1))) as fillet1_piece_21:
        with BuildLine():
            CenterArc((FILLET1_R, -FILLET1_R), FILLET1_R, 90, 90)
            Line((0, -FILLET1_R), (0, 0))
            Line((0, 0), (FILLET1_R, 0))
        make_face()
    extrude(amount=34, mode=Mode.SUBTRACT)
    with BuildSketch(Plane(origin=(-29.960550109, 0, -5.405234518), x_dir=(0, 0.5735764363510492, -0.8191520442889897), z_dir=(1, 0, 0))) as fillet1_piece_22:
        with BuildLine():
            CenterArc((FILLET1_R * 0.315298788879, FILLET1_R), FILLET1_R, 235, 35)
            Line((-FILLET1_R * 0.258277647472, FILLET1_R * 0.180847955711), (0, 0))
            Line((0, 0), (FILLET1_R * 0.315298788879, 0))
        make_face()
    extrude(amount=5.682370458, mode=Mode.SUBTRACT)
    with BuildSketch(Plane(origin=(-30.73030609, 9.2, -18.54419618), x_dir=(0, 1, 0), z_dir=(1, 0, 0))) as fillet1_piece_23:
        with BuildLine():
            CenterArc((FILLET1_R * 0.520567050552, FILLET1_R), FILLET1_R, 215, 55)
            Line((-FILLET1_R * 0.298584993737, FILLET1_R * 0.426423563649), (0, 0))
            Line((0, 0), (FILLET1_R * 0.520567050552, 0))
        make_face()
    extrude(amount=6.45212644, mode=Mode.SUBTRACT)

    # Fillet2
    fillet2_edges = [part.edges().sort_by_distance(p)[0] for p in [
        (-22.17817965, 3, -11.04419618),
        (-22.17817965, 2.25, 4.45580382),
        (-22.92817965, 3, -26.54419618),
        (-22.17817965, 2.25, -26.54419618),
        (-23.67817965, 3, -11.04419618),
        (-23.67817965, 2.25, -26.54419618),
        (-22.92817965, 3, 4.45580382),
        (-23.67817965, 2.25, 4.45580382),
        (-23.67817965, 0, -13.724715349),
        (-22.17817965, 0, -13.724715349),
        (-23.67817965, 0.439339828, -26.104856352),
        (-23.67817965, 1.246347032, 4.434201659),
        (-22.17817965, 0.439339828, -26.104856352),
        (-22.17817965, 1.246347032, 4.434201659),
    ]]
    fillet(fillet2_edges, radius=FILLET2_R)


solid = part.part
